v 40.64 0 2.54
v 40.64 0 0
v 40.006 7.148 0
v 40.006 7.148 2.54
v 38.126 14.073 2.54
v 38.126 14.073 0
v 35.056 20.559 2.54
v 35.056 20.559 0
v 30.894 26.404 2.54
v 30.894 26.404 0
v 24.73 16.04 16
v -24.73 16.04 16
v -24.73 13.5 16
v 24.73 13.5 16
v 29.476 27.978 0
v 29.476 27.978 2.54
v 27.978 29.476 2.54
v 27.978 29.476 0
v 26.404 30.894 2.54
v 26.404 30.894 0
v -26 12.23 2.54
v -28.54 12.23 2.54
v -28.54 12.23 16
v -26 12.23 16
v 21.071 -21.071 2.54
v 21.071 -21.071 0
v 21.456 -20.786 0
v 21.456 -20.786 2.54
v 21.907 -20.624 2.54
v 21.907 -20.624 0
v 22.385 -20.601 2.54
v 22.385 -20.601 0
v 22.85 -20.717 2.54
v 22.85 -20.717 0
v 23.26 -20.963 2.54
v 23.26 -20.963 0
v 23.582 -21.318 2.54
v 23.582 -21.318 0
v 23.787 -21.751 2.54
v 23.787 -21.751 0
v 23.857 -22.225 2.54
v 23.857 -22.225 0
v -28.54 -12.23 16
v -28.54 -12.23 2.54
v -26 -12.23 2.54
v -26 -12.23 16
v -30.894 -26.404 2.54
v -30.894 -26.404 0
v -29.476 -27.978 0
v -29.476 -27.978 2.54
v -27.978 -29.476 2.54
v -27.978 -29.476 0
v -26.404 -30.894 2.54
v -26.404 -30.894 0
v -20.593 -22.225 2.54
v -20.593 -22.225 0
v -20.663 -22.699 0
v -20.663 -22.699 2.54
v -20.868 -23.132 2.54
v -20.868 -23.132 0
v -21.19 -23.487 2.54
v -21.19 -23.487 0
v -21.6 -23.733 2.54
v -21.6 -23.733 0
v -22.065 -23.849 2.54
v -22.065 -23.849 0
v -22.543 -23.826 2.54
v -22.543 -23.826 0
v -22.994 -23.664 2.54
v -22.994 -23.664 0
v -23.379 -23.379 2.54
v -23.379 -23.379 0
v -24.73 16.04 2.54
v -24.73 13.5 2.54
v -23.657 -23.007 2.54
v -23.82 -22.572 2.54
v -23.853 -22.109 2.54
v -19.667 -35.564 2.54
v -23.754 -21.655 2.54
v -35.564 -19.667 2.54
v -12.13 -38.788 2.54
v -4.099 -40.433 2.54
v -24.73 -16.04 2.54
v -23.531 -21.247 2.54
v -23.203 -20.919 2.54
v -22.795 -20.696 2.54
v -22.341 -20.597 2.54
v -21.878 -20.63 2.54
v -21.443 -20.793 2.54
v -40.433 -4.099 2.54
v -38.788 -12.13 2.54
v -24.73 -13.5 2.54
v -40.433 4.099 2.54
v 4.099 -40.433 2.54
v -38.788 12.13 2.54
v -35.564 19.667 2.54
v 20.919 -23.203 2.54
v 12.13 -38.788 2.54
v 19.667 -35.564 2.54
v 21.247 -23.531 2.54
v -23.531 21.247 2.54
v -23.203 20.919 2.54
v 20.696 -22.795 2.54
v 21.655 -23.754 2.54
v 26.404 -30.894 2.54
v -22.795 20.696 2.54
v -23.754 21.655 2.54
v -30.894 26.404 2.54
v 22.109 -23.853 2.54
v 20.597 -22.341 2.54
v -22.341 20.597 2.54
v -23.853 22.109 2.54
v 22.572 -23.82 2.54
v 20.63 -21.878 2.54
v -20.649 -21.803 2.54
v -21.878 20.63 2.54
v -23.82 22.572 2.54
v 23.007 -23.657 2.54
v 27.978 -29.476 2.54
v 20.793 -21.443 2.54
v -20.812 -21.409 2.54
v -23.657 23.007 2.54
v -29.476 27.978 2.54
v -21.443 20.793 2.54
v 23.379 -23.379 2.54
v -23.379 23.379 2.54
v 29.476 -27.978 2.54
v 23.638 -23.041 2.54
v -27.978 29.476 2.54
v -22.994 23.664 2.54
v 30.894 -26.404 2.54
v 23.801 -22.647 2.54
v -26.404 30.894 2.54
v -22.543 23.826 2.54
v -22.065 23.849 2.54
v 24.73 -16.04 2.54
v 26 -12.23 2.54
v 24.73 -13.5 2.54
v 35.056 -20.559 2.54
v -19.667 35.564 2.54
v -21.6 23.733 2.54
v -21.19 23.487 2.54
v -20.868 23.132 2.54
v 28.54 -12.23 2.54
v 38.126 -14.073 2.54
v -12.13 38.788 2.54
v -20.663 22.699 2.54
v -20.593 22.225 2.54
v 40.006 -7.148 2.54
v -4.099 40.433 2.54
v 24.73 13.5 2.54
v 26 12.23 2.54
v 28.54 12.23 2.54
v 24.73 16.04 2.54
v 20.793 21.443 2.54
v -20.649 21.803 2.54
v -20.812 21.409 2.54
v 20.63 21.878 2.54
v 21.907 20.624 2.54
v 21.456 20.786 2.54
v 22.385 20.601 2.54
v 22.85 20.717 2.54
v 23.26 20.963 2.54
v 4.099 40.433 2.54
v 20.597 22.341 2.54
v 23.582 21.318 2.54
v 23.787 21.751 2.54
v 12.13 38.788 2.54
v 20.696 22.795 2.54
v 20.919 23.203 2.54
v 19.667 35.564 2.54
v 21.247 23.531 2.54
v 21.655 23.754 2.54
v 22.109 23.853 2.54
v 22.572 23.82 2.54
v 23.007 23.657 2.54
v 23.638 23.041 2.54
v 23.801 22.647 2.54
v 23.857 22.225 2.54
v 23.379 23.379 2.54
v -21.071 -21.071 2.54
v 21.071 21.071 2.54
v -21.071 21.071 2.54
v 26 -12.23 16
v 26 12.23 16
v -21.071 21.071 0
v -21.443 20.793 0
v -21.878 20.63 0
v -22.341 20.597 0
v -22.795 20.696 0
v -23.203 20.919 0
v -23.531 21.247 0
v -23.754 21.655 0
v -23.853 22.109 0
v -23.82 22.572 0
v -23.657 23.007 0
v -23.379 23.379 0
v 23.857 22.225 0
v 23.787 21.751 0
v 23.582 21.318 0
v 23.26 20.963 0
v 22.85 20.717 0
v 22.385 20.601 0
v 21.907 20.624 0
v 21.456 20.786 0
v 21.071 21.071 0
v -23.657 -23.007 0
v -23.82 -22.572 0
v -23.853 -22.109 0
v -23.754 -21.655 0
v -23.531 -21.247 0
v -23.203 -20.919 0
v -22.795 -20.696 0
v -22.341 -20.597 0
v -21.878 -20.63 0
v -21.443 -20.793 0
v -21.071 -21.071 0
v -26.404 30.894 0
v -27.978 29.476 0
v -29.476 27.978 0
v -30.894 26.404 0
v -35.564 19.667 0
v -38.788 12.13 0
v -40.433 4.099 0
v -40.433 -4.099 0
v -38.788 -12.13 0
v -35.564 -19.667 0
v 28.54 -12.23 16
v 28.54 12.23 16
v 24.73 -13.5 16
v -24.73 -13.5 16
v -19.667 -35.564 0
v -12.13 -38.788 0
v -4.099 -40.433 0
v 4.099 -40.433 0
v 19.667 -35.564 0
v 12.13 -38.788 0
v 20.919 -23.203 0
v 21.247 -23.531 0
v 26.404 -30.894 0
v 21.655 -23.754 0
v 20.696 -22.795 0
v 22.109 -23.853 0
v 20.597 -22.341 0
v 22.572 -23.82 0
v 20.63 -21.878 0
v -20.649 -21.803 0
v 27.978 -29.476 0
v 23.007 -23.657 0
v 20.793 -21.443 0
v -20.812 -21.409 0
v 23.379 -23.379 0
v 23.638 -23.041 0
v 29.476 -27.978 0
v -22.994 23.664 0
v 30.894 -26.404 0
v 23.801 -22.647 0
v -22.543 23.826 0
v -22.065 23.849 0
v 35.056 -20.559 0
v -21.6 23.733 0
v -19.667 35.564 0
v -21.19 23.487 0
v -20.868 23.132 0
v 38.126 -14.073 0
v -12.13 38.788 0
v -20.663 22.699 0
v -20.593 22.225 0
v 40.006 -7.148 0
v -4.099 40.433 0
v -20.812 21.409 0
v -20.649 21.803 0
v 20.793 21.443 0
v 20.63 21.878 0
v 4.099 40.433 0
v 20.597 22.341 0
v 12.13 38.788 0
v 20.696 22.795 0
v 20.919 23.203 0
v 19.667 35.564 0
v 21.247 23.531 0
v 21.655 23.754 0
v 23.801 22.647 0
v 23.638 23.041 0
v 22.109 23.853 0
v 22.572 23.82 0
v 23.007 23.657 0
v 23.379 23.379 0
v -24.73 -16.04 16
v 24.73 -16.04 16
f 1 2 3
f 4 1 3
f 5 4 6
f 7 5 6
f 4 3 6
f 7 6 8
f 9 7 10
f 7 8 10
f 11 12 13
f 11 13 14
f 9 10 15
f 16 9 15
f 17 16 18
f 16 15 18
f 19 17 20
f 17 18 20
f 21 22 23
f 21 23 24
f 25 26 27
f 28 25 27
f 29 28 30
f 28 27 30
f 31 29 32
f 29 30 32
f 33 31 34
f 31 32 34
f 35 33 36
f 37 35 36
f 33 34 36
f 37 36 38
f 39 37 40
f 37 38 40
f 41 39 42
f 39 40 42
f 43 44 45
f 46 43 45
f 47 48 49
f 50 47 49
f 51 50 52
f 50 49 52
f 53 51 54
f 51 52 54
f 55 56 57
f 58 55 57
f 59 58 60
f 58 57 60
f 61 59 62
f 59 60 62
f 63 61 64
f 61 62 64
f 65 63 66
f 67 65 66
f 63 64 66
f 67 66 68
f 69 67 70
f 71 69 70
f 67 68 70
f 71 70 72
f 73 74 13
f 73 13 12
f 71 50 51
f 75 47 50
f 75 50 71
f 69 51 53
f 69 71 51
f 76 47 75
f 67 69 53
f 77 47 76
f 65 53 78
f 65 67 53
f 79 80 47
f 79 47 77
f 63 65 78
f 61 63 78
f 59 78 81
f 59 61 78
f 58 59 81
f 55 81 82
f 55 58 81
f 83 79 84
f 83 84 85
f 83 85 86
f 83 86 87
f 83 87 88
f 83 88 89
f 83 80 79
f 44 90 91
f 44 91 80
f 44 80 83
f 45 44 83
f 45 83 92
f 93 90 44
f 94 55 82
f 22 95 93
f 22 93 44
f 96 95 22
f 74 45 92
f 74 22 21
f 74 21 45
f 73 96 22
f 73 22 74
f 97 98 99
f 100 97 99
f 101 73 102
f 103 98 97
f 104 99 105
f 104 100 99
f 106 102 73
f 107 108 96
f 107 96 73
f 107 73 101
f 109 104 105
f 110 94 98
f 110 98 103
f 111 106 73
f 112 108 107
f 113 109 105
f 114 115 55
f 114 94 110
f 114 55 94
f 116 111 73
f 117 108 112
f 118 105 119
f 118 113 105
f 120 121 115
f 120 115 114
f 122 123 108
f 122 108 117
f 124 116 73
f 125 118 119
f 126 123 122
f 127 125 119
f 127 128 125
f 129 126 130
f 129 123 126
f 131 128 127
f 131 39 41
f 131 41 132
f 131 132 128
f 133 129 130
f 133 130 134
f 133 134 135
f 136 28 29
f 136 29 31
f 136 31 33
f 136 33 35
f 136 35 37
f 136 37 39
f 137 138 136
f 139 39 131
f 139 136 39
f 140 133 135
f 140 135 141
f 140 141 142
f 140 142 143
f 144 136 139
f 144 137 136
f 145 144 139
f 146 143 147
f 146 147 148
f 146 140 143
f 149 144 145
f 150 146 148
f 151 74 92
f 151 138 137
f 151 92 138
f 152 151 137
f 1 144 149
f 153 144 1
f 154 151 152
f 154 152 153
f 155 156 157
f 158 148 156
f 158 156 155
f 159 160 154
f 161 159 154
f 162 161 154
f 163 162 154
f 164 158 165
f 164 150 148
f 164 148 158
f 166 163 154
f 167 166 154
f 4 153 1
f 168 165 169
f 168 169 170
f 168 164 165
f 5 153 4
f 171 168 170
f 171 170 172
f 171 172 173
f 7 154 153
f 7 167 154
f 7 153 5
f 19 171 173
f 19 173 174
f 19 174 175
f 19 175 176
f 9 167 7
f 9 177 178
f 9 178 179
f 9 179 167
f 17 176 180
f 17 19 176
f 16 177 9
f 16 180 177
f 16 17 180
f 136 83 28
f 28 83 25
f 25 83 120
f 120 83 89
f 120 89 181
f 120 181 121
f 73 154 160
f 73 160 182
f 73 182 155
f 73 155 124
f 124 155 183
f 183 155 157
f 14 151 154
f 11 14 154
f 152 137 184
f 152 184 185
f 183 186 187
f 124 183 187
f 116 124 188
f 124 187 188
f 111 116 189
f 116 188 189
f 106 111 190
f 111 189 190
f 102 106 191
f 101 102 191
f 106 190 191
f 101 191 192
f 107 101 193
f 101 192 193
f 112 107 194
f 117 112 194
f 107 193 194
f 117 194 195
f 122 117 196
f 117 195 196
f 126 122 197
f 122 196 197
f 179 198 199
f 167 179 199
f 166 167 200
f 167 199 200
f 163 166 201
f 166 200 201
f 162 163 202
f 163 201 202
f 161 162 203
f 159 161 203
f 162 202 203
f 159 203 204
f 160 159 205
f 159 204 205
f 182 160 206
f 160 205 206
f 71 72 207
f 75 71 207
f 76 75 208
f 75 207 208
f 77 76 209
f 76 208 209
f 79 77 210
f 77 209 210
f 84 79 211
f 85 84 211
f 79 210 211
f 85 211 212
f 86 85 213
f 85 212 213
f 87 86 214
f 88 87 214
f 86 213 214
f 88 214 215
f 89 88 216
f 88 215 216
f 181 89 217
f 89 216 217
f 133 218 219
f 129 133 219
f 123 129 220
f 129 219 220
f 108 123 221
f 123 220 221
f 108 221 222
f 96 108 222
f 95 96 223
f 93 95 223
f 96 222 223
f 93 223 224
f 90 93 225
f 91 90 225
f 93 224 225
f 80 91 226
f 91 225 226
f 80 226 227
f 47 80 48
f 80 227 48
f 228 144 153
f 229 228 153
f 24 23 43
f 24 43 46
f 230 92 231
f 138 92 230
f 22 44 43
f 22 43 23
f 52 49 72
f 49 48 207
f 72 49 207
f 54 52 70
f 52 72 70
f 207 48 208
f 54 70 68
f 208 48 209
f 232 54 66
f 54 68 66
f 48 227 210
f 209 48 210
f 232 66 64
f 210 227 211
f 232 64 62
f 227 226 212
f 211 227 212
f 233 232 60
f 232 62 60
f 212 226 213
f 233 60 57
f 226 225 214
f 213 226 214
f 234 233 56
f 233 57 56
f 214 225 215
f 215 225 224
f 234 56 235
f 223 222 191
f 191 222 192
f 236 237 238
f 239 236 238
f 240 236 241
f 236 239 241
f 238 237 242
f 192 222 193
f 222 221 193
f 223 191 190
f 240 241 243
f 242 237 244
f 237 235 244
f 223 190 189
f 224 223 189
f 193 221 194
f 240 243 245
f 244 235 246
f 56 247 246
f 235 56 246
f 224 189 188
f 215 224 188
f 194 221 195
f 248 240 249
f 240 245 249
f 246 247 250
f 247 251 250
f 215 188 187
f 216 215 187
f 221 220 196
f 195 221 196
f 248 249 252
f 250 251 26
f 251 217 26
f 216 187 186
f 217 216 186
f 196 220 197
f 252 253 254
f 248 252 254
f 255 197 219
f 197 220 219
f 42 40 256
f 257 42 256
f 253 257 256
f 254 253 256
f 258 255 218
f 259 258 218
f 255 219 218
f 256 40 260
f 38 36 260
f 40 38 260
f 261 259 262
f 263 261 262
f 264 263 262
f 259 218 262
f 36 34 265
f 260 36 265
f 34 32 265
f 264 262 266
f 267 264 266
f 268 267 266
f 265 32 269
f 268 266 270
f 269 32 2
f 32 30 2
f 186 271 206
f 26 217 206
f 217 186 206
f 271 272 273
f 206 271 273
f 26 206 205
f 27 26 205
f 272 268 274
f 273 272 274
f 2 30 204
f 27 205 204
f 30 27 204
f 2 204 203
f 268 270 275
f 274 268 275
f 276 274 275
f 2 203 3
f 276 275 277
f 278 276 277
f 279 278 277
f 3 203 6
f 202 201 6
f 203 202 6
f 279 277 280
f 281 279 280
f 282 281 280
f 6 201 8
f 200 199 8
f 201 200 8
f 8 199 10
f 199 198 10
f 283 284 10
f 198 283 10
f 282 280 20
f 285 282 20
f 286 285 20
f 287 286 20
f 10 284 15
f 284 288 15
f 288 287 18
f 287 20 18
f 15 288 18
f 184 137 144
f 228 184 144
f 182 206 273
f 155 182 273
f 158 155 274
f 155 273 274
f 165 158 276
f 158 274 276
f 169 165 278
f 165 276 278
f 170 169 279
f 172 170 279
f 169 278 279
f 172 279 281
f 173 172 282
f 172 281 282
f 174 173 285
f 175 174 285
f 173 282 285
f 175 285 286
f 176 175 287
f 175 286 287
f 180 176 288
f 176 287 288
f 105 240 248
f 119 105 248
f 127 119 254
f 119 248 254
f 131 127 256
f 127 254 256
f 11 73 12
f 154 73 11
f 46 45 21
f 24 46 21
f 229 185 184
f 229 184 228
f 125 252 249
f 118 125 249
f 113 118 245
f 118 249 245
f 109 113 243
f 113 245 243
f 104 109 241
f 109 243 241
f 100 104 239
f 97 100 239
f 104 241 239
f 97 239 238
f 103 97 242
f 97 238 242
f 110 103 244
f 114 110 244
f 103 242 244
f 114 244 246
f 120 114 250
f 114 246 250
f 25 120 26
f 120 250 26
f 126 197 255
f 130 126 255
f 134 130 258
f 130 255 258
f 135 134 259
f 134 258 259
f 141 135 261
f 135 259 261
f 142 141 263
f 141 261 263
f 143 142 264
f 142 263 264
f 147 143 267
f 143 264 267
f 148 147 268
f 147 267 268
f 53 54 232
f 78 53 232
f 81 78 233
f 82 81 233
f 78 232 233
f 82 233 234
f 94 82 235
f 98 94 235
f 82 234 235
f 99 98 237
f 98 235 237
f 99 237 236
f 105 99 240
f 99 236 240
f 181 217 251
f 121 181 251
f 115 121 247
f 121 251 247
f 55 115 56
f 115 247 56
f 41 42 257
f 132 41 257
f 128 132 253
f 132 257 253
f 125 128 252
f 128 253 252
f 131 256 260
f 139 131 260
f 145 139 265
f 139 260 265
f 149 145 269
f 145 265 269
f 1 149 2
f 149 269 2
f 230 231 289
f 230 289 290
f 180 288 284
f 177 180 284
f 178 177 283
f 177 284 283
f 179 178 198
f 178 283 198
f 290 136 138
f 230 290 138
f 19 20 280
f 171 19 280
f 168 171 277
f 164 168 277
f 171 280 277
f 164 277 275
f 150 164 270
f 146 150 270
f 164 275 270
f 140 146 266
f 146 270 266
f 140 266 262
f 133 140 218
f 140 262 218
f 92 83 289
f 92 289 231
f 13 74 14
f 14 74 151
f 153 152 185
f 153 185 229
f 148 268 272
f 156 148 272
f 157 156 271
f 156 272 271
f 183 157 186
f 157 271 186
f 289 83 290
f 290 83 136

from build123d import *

# Parameters (mm, degrees)
F1_DEPTH = 2.54
F2_W     = 2.54
F2_H     = 24.46
F2_W_2   = 49.46
F2_H_2   = 2.54
F3_DEPTH = 16


with BuildPart() as f1:
    # F0 (on Top) → F1 (new body)
    with BuildSketch(Plane.XY):
        with BuildLine():
            ThreePointArc((-29.0921250892, -24.6019970286), (-38.1, 0), (-29.0921250892, 24.6019970286))
            Line((-29.0921250892, 24.6019970286), (-30.8940515778, 26.4039235173))
            ThreePointArc((-30.8940515778, 26.4039235173), (-40.64, 0), (-30.8940515778, -26.4039235173))
            Line((-30.8940515778, -26.4039235173), (-29.0921250892, -24.6019970286))
        make_face()
        with BuildLine():
            ThreePointArc((-29.0921250892, 24.6019970286), (-26.9407683632, 26.9407683632), (-24.6019970286, 29.0921250892))
            Line((-24.6019970286, 29.0921250892), (-26.4039235173, 30.8940515778))
            ThreePointArc((-26.4039235173, 30.8940515778), (-28.7368195874, 28.7368195874), (-30.8940515778, 26.4039235173))
            Line((-30.8940515778, 26.4039235173), (-29.0921250892, 24.6019970286))
        make_face()
        with BuildLine():
            Line((-26.4039235173, 30.8940515778), (-24.6019970286, 29.0921250892))
            ThreePointArc((-24.6019970286, 29.0921250892), (0, 38.1), (24.6019970286, 29.0921250892))
            Line((24.6019970286, 29.0921250892), (26.4039235173, 30.8940515778))
            ThreePointArc((26.4039235173, 30.8940515778), (0, 40.64), (-26.4039235173, 30.8940515778))
        make_face()
        with BuildLine():
            Line((26.4039235173, 30.8940515778), (24.6019970286, 29.0921250892))
            ThreePointArc((24.6019970286, 29.0921250892), (26.9407683632, 26.9407683632), (29.0921250892, 24.6019970286))
            Line((29.0921250892, 24.6019970286), (30.8940515778, 26.4039235173))
            ThreePointArc((30.8940515778, 26.4039235173), (28.7368195874, 28.7368195874), (26.4039235173, 30.8940515778))
        make_face()
        with BuildLine():
            Line((30.8940515778, 26.4039235173), (29.0921250892, 24.6019970286))
            ThreePointArc((29.0921250892, 24.6019970286), (35.7772271557, 13.0996189659), (38.1, 0))
            ThreePointArc((38.1, 0), (35.7772271557, -13.0996189659), (29.0921250892, -24.6019970286))
            Line((29.0921250892, -24.6019970286), (30.8940515778, -26.4039235173))
            ThreePointArc((30.8940515778, -26.4039235173), (38.1257383937, -14.0725858299), (40.64, 0))
            ThreePointArc((40.64, 0), (38.1257383937, 14.0725858299), (30.8940515778, 26.4039235173))
        make_face()
        with BuildLine():
            ThreePointArc((29.0921250892, -24.6019970286), (26.9407683632, -26.9407683632), (24.6019970286, -29.0921250892))
            Line((24.6019970286, -29.0921250892), (26.4039235173, -30.8940515778))
            ThreePointArc((26.4039235173, -30.8940515778), (28.7368195874, -28.7368195874), (30.8940515778, -26.4039235173))
            Line((30.8940515778, -26.4039235173), (29.0921250892, -24.6019970286))
        make_face()
        with BuildLine():
            ThreePointArc((-24.6019970286, -29.0921250892), (-26.9407683632, -26.9407683632), (-29.0921250892, -24.6019970286))
            Line((-29.0921250892, -24.6019970286), (-30.8940515778, -26.4039235173))
            ThreePointArc((-30.8940515778, -26.4039235173), (-28.7368195874, -28.7368195874), (-26.4039235173, -30.8940515778))
            Line((-26.4039235173, -30.8940515778), (-24.6019970286, -29.0921250892))
        make_face()
        with BuildLine():
            Line((-25.4, -20.9098719395), (-25.4, 20.9098719395))
            Line((-25.4, 20.9098719395), (-29.0921250892, 24.6019970286))
            ThreePointArc((-29.0921250892, 24.6019970286), (-38.1, 0), (-29.0921250892, -24.6019970286))
            Line((-29.0921250892, -24.6019970286), (-25.4, -20.9098719395))
        make_face()
        with BuildLine():
            Line((24.6019970286, 29.0921250892), (20.9098719395, 25.4))
            Line((20.9098719395, 25.4), (22.225, 25.4))
            Line((22.225, 25.4), (25.4, 25.4))
            Line((25.4, 25.4), (25.4, 22.225))
            Line((25.4, 22.225), (25.4, 20.9098719395))
            Line((25.4, 20.9098719395), (29.0921250892, 24.6019970286))
            ThreePointArc((29.0921250892, 24.6019970286), (26.9407683632, 26.9407683632), (24.6019970286, 29.0921250892))
        make_face()
        with BuildLine():
            Line((20.9098719395, -25.4), (24.6019970286, -29.0921250892))
            ThreePointArc((24.6019970286, -29.0921250892), (26.9407683632, -26.9407683632), (29.0921250892, -24.6019970286))
            Line((29.0921250892, -24.6019970286), (25.4, -20.9098719395))
            Line((25.4, -20.9098719395), (25.4, -22.225))
            Line((25.4, -22.225), (25.4, -25.4))
            Line((25.4, -25.4), (22.2249999363, -25.4))
            Line((22.2249999363, -25.4), (20.9098719395, -25.4))
        make_face()
        with BuildLine():
            Line((-25.4, -22.2250000637), (-25.4, -20.9098719395))
            Line((-25.4, -20.9098719395), (-29.0921250892, -24.6019970286))
            ThreePointArc((-29.0921250892, -24.6019970286), (-26.9407683632, -26.9407683632), (-24.6019970286, -29.0921250892))
            Line((-24.6019970286, -29.0921250892), (-20.9098719395, -25.4))
            Line((-20.9098719395, -25.4), (-22.225, -25.4))
            Line((-22.225, -25.4), (-25.4, -25.4))
            Line((-25.4, -25.4), (-25.4, -22.2250000637))
        make_face()
        with BuildLine():
            Line((-20.9098719395, -25.4), (-24.6019970286, -29.0921250892))
            ThreePointArc((-24.6019970286, -29.0921250892), (0, -38.1), (24.6019970286, -29.0921250892))
            Line((24.6019970286, -29.0921250892), (20.9098719395, -25.4))
            Line((20.9098719395, -25.4), (-20.9098719395, -25.4))
        make_face()
        with BuildLine():
            ThreePointArc((24.6019970286, -29.0921250892), (0, -38.1), (-24.6019970286, -29.0921250892))
            Line((-24.6019970286, -29.0921250892), (-26.4039235173, -30.8940515778))
            ThreePointArc((-26.4039235173, -30.8940515778), (0, -40.64), (26.4039235173, -30.8940515778))
            Line((26.4039235173, -30.8940515778), (24.6019970286, -29.0921250892))
        make_face()
        with BuildLine():
            ThreePointArc((-24.4700640303, -24.4700640303), (-25.1583175035, -23.4400199272), (-25.4, -22.2250000637))
            Line((-25.4, -22.2250000637), (-25.4, -25.4))
            Line((-25.4, -25.4), (-24.4700640303, -24.4700640303))
        make_face()
        with BuildLine():
            Line((-24.4700640303, -24.4700640303), (-25.4, -25.4))
            Line((-25.4, -25.4), (-22.225, -25.4))
            ThreePointArc((-22.225, -25.4), (-23.4400198978, -25.1583175157), (-24.4700640303, -24.4700640303))
        make_face()
        with BuildLine():
            Line((-23.3789629116, -23.3789629116), (-24.4700640303, -24.4700640303))
            ThreePointArc((-24.4700640303, -24.4700640303), (-23.4400198978, -25.1583175157), (-22.225, -25.4))
            ThreePointArc((-22.225, -25.4), (-21.0099801022, -25.1583175157), (-19.9799359697, -24.4700640303))
            ThreePointArc((-19.9799359697, -24.4700640303), (-19.2916824843, -23.4400198978), (-19.05, -22.225))
            ThreePointArc((-19.05, -22.225), (-19.2916824843, -21.0099801022), (-19.9799359697, -19.9799359697))
            Line((-19.9799359697, -19.9799359697), (-21.0710370884, -21.0710370884))
            ThreePointArc((-21.0710370884, -21.0710370884), (-20.7172747969, -21.6004797726), (-20.59305, -22.225))
            ThreePointArc((-20.59305, -22.225), (-21.6004797726, -23.7327252031), (-23.3789629116, -23.3789629116))
        make_face()
        with BuildLine():
            ThreePointArc((-24.4700640303, -19.9799359697), (-25.1583175279, -21.0099801317), (-25.4, -22.2250000637))
            ThreePointArc((-25.4, -22.2250000637), (-25.1583175035, -23.4400199272), (-24.4700640303, -24.4700640303))
            Line((-24.4700640303, -24.4700640303), (-23.3789629116, -23.3789629116))
            ThreePointArc((-23.3789629116, -23.3789629116), (-23.3789629116, -21.0710370884), (-21.0710370884, -21.0710370884))
            Line((-21.0710370884, -21.0710370884), (-19.9799359697, -19.9799359697))
            ThreePointArc((-19.9799359697, -19.9799359697), (-22.225, -19.05), (-24.4700640303, -19.9799359697))
        make_face()
        with BuildLine():
            Line((-24.4700640303, -19.9799359697), (-25.4, -20.9098719395))
            Line((-25.4, -20.9098719395), (-25.4, -22.2250000637))
            ThreePointArc((-25.4, -22.2250000637), (-25.1583175279, -21.0099801317), (-24.4700640303, -19.9799359697))
        make_face()
        with BuildLine():
            ThreePointArc((-19.9799359697, -24.4700640303), (-21.0099801022, -25.1583175157), (-22.225, -25.4))
            Line((-22.225, -25.4), (-20.9098719395, -25.4))
            Line((-20.9098719395, -25.4), (-19.9799359697, -24.4700640303))
        make_face()
        with BuildLine():
            Line((-24.4700644462, 19.9799363857), (-25.4, 20.9098719395))
            Line((-25.4, 20.9098719395), (-25.4, -20.9098719395))
            Line((-25.4, -20.9098719395), (-24.4700640303, -19.9799359697))
            ThreePointArc((-24.4700640303, -19.9799359697), (-22.225, -19.05), (-19.9799359697, -19.9799359697))
            Line((-19.9799359697, -19.9799359697), (0, 0))
            Line((0, 0), (-19.9799359697, 19.9799359697))
            ThreePointArc((-19.9799359697, 19.9799359697), (-22.2250002941, 19.05), (-24.4700644462, 19.9799363857))
        make_face()
        with BuildLine():
            Line((-24.4700640303, 24.4700640303), (-25.4, 25.4))
            Line((-25.4, 25.4), (-25.4, 22.225))
            ThreePointArc((-25.4, 22.225), (-25.1583175157, 23.4400198978), (-24.4700640303, 24.4700640303))
        make_face()
        with BuildLine():
            ThreePointArc((-24.4700644462, 19.9799363857), (-25.1583176283, 21.009980374), (-25.4, 22.225))
            Line((-25.4, 22.225), (-25.4, 20.9098719395))
            Line((-25.4, 20.9098719395), (-24.4700644462, 19.9799363857))
        make_face()
        with BuildLine():
            Line((-20.9098719395, 25.4), (-22.225, 25.4))
            ThreePointArc((-22.225, 25.4), (-21.0099800636, 25.1583174997), (-19.9799359106, 24.4700639711))
            Line((-19.9799359106, 24.4700639711), (-20.9098719395, 25.4))
        make_face()
        with BuildLine():
            Line((-22.225, 25.4), (-25.4, 25.4))
            Line((-25.4, 25.4), (-24.4700640303, 24.4700640303))
            ThreePointArc((-24.4700640303, 24.4700640303), (-23.4400198978, 25.1583175157), (-22.225, 25.4))
        make_face()
        with BuildLine():
            Line((-25.4, 22.225), (-25.4, 25.4))
            Line((-25.4, 25.4), (-22.225, 25.4))
            Line((-22.225, 25.4), (-20.9098719395, 25.4))
            Line((-20.9098719395, 25.4), (-24.6019970286, 29.0921250892))
            ThreePointArc((-24.6019970286, 29.0921250892), (-26.9407683632, 26.9407683632), (-29.0921250892, 24.6019970286))
            Line((-29.0921250892, 24.6019970286), (-25.4, 20.9098719395))
            Line((-25.4, 20.9098719395), (-25.4, 22.225))
        make_face()
        with BuildLine():
            Line((-24.6019970286, 29.0921250892), (-20.9098719395, 25.4))
            Line((-20.9098719395, 25.4), (20.9098719395, 25.4))
            Line((20.9098719395, 25.4), (24.6019970286, 29.0921250892))
            ThreePointArc((24.6019970286, 29.0921250892), (0, 38.1), (-24.6019970286, 29.0921250892))
        make_face()
        with BuildLine():
            Line((25.4, 25.4), (22.225, 25.4))
            ThreePointArc((22.225, 25.4), (23.4400198978, 25.1583175157), (24.4700640303, 24.4700640303))
            Line((24.4700640303, 24.4700640303), (25.4, 25.4))
        make_face()
        with BuildLine():
            Line((25.4, 22.225), (25.4, 25.4))
            Line((25.4, 25.4), (24.4700640303, 24.4700640303))
            ThreePointArc((24.4700640303, 24.4700640303), (25.1583175157, 23.4400198978), (25.4, 22.225))
        make_face()
        with BuildLine():
            Line((22.225, 25.4), (20.9098719395, 25.4))
            Line((20.9098719395, 25.4), (19.9799359697, 24.4700640303))
            ThreePointArc((19.9799359697, 24.4700640303), (21.0099801022, 25.1583175157), (22.225, 25.4))
        make_face()
        with BuildLine():
            Line((25.4, 20.9098719395), (25.4, 22.225))
            ThreePointArc((25.4, 22.225), (25.1583175157, 21.0099801022), (24.4700640303, 19.9799359697))
            Line((24.4700640303, 19.9799359697), (25.4, 20.9098719395))
        make_face()
        with BuildLine():
            ThreePointArc((38.1, 0), (35.7772271557, 13.0996189659), (29.0921250892, 24.6019970286))
            Line((29.0921250892, 24.6019970286), (25.4, 20.9098719395))
            Line((25.4, 20.9098719395), (25.4, -20.9098719395))
            Line((25.4, -20.9098719395), (29.0921250892, -24.6019970286))
            ThreePointArc((29.0921250892, -24.6019970286), (35.7772271557, -13.0996189659), (38.1, 0))
        make_face()
        with BuildLine():
            Line((19.9799359697, -19.9799359697), (0, 0))
            Line((0, 0), (-19.9799359697, -19.9799359697))
            ThreePointArc((-19.9799359697, -19.9799359697), (-19.2916824843, -21.0099801022), (-19.05, -22.225))
            ThreePointArc((-19.05, -22.225), (-19.2916824843, -23.4400198978), (-19.9799359697, -24.4700640303))
            Line((-19.9799359697, -24.4700640303), (-20.9098719395, -25.4))
            Line((-20.9098719395, -25.4), (20.9098719395, -25.4))
            Line((20.9098719395, -25.4), (19.9799358262, -24.4700638867))
            ThreePointArc((19.9799358262, -24.4700638867), (19.05, -22.2249998985), (19.9799359697, -19.9799359697))
        make_face()
        with BuildLine():
            Line((19.9799359697, 19.9799359697), (0, 0))
            Line((0, 0), (19.9799359697, -19.9799359697))
            ThreePointArc((19.9799359697, -19.9799359697), (22.2249999638, -19.05), (24.4700639791, -19.9799359186))
            Line((24.4700639791, -19.9799359186), (25.4, -20.9098719395))
            Line((25.4, -20.9098719395), (25.4, 20.9098719395))
            Line((25.4, 20.9098719395), (24.4700640303, 19.9799359697))
            ThreePointArc((24.4700640303, 19.9799359697), (22.225, 19.05), (19.9799359697, 19.9799359697))
        make_face()
        with BuildLine():
            Line((20.9098719395, 25.4), (-20.9098719395, 25.4))
            Line((-20.9098719395, 25.4), (-19.9799359106, 24.4700639711))
            ThreePointArc((-19.9799359106, 24.4700639711), (-19.2916824683, 23.4400198591), (-19.05, 22.225))
            ThreePointArc((-19.05, 22.225), (-19.2916824843, 21.0099801022), (-19.9799359697, 19.9799359697))
            Line((-19.9799359697, 19.9799359697), (0, 0))
            Line((0, 0), (19.9799359697, 19.9799359697))
            ThreePointArc((19.9799359697, 19.9799359697), (19.05, 22.225), (19.9799359697, 24.4700640303))
            Line((19.9799359697, 24.4700640303), (20.9098719395, 25.4))
        make_face()
        with BuildLine():
            ThreePointArc((22.2249999363, -25.4), (21.009979979, -25.1583174647), (19.9799358262, -24.4700638867))
            Line((19.9799358262, -24.4700638867), (20.9098719395, -25.4))
            Line((20.9098719395, -25.4), (22.2249999363, -25.4))
        make_face()
        with BuildLine():
            ThreePointArc((24.4700640303, -24.4700640303), (23.4400198683, -25.1583175279), (22.2249999363, -25.4))
            Line((22.2249999363, -25.4), (25.4, -25.4))
            Line((25.4, -25.4), (24.4700640303, -24.4700640303))
        make_face()
        with BuildLine():
            Line((25.4, -25.4), (25.4, -22.225))
            ThreePointArc((25.4, -22.225), (25.1583175157, -23.4400198978), (24.4700640303, -24.4700640303))
            Line((24.4700640303, -24.4700640303), (25.4, -25.4))
        make_face()
        with BuildLine():
            Line((25.4, -20.9098719395), (24.4700639791, -19.9799359186))
            ThreePointArc((24.4700639791, -19.9799359186), (25.1583175019, -21.0099800688), (25.4, -22.225))
            Line((25.4, -22.225), (25.4, -20.9098719395))
        make_face()
        with BuildLine():
            ThreePointArc((-24.4700640303, 24.4700640303), (-25.1583175157, 23.4400198978), (-25.4, 22.225))
            ThreePointArc((-25.4, 22.225), (-25.1583176283, 21.009980374), (-24.4700644462, 19.9799363857))
            ThreePointArc((-24.4700644462, 19.9799363857), (-22.2250002941, 19.05), (-19.9799359697, 19.9799359697))
            Line((-19.9799359697, 19.9799359697), (-21.0710370884, 21.0710370884))
            ThreePointArc((-21.0710370884, 21.0710370884), (-23.3789629116, 21.0710370884), (-23.3789629116, 23.3789629116))
            Line((-23.3789629116, 23.3789629116), (-24.4700640303, 24.4700640303))
        make_face()
        with BuildLine():
            ThreePointArc((-19.9799359106, 24.4700639711), (-21.0099800636, 25.1583174997), (-22.225, 25.4))
            ThreePointArc((-22.225, 25.4), (-23.4400198978, 25.1583175157), (-24.4700640303, 24.4700640303))
            Line((-24.4700640303, 24.4700640303), (-23.3789629116, 23.3789629116))
            ThreePointArc((-23.3789629116, 23.3789629116), (-21.6004797726, 23.7327252031), (-20.59305, 22.225))
            ThreePointArc((-20.59305, 22.225), (-20.7172747969, 21.6004797726), (-21.0710370884, 21.0710370884))
            Line((-21.0710370884, 21.0710370884), (-19.9799359697, 19.9799359697))
            ThreePointArc((-19.9799359697, 19.9799359697), (-19.2916824843, 21.0099801022), (-19.05, 22.225))
            ThreePointArc((-19.05, 22.225), (-19.2916824683, 23.4400198591), (-19.9799359106, 24.4700639711))
        make_face()
        with BuildLine():
            ThreePointArc((24.4700640303, 24.4700640303), (23.4400198978, 25.1583175157), (22.225, 25.4))
            ThreePointArc((22.225, 25.4), (21.0099801022, 25.1583175157), (19.9799359697, 24.4700640303))
            ThreePointArc((19.9799359697, 24.4700640303), (19.05, 22.225), (19.9799359697, 19.9799359697))
            Line((19.9799359697, 19.9799359697), (21.0710370884, 21.0710370884))
            ThreePointArc((21.0710370884, 21.0710370884), (21.0710370884, 23.3789629116), (23.3789629116, 23.3789629116))
            Line((23.3789629116, 23.3789629116), (24.4700640303, 24.4700640303))
        make_face()
        with BuildLine():
            ThreePointArc((25.4, 22.225), (25.1583175157, 23.4400198978), (24.4700640303, 24.4700640303))
            Line((24.4700640303, 24.4700640303), (23.3789629116, 23.3789629116))
            ThreePointArc((23.3789629116, 23.3789629116), (23.7327252031, 22.8495202274), (23.85695, 22.225))
            ThreePointArc((23.85695, 22.225), (22.8495202274, 20.7172747969), (21.0710370884, 21.0710370884))
            Line((21.0710370884, 21.0710370884), (19.9799359697, 19.9799359697))
            ThreePointArc((19.9799359697, 19.9799359697), (22.225, 19.05), (24.4700640303, 19.9799359697))
            ThreePointArc((24.4700640303, 19.9799359697), (25.1583175157, 21.0099801022), (25.4, 22.225))
        make_face()
        with BuildLine():
            Line((21.0710370884, -21.0710370884), (19.9799359697, -19.9799359697))
            ThreePointArc((19.9799359697, -19.9799359697), (19.05, -22.2249998985), (19.9799358262, -24.4700638867))
            ThreePointArc((19.9799358262, -24.4700638867), (21.009979979, -25.1583174647), (22.2249999363, -25.4))
            ThreePointArc((22.2249999363, -25.4), (23.4400198683, -25.1583175279), (24.4700640303, -24.4700640303))
            Line((24.4700640303, -24.4700640303), (23.3789629116, -23.3789629116))
            ThreePointArc((23.3789629116, -23.3789629116), (21.0710370884, -23.3789629116), (21.0710370884, -21.0710370884))
        make_face()
        with BuildLine():
            ThreePointArc((24.4700639791, -19.9799359186), (22.2249999638, -19.05), (19.9799359697, -19.9799359697))
            Line((19.9799359697, -19.9799359697), (21.0710370884, -21.0710370884))
            ThreePointArc((21.0710370884, -21.0710370884), (22.8495202274, -20.7172747969), (23.85695, -22.225))
            ThreePointArc((23.85695, -22.225), (23.7327252031, -22.8495202274), (23.3789629116, -23.3789629116))
            Line((23.3789629116, -23.3789629116), (24.4700640303, -24.4700640303))
            ThreePointArc((24.4700640303, -24.4700640303), (25.1583175157, -23.4400198978), (25.4, -22.225))
            ThreePointArc((25.4, -22.225), (25.1583175019, -21.0099800688), (24.4700639791, -19.9799359186))
        make_face()
    extrude(amount=F1_DEPTH)

    # F2 (on Top) → F3 (join)
    with BuildSketch(Plane.XY):
        with Locations((-27.27, 0)):
            Rectangle(F2_W, F2_H)
        with Locations((0, 14.77)):
            Rectangle(F2_W_2, F2_H_2)
        with Locations((27.27, 0)):
            Rectangle(F2_W, F2_H)
        with Locations((0, -14.77)):
            Rectangle(F2_W_2, F2_H_2)
    extrude(amount=F3_DEPTH)


solid = f1.part
